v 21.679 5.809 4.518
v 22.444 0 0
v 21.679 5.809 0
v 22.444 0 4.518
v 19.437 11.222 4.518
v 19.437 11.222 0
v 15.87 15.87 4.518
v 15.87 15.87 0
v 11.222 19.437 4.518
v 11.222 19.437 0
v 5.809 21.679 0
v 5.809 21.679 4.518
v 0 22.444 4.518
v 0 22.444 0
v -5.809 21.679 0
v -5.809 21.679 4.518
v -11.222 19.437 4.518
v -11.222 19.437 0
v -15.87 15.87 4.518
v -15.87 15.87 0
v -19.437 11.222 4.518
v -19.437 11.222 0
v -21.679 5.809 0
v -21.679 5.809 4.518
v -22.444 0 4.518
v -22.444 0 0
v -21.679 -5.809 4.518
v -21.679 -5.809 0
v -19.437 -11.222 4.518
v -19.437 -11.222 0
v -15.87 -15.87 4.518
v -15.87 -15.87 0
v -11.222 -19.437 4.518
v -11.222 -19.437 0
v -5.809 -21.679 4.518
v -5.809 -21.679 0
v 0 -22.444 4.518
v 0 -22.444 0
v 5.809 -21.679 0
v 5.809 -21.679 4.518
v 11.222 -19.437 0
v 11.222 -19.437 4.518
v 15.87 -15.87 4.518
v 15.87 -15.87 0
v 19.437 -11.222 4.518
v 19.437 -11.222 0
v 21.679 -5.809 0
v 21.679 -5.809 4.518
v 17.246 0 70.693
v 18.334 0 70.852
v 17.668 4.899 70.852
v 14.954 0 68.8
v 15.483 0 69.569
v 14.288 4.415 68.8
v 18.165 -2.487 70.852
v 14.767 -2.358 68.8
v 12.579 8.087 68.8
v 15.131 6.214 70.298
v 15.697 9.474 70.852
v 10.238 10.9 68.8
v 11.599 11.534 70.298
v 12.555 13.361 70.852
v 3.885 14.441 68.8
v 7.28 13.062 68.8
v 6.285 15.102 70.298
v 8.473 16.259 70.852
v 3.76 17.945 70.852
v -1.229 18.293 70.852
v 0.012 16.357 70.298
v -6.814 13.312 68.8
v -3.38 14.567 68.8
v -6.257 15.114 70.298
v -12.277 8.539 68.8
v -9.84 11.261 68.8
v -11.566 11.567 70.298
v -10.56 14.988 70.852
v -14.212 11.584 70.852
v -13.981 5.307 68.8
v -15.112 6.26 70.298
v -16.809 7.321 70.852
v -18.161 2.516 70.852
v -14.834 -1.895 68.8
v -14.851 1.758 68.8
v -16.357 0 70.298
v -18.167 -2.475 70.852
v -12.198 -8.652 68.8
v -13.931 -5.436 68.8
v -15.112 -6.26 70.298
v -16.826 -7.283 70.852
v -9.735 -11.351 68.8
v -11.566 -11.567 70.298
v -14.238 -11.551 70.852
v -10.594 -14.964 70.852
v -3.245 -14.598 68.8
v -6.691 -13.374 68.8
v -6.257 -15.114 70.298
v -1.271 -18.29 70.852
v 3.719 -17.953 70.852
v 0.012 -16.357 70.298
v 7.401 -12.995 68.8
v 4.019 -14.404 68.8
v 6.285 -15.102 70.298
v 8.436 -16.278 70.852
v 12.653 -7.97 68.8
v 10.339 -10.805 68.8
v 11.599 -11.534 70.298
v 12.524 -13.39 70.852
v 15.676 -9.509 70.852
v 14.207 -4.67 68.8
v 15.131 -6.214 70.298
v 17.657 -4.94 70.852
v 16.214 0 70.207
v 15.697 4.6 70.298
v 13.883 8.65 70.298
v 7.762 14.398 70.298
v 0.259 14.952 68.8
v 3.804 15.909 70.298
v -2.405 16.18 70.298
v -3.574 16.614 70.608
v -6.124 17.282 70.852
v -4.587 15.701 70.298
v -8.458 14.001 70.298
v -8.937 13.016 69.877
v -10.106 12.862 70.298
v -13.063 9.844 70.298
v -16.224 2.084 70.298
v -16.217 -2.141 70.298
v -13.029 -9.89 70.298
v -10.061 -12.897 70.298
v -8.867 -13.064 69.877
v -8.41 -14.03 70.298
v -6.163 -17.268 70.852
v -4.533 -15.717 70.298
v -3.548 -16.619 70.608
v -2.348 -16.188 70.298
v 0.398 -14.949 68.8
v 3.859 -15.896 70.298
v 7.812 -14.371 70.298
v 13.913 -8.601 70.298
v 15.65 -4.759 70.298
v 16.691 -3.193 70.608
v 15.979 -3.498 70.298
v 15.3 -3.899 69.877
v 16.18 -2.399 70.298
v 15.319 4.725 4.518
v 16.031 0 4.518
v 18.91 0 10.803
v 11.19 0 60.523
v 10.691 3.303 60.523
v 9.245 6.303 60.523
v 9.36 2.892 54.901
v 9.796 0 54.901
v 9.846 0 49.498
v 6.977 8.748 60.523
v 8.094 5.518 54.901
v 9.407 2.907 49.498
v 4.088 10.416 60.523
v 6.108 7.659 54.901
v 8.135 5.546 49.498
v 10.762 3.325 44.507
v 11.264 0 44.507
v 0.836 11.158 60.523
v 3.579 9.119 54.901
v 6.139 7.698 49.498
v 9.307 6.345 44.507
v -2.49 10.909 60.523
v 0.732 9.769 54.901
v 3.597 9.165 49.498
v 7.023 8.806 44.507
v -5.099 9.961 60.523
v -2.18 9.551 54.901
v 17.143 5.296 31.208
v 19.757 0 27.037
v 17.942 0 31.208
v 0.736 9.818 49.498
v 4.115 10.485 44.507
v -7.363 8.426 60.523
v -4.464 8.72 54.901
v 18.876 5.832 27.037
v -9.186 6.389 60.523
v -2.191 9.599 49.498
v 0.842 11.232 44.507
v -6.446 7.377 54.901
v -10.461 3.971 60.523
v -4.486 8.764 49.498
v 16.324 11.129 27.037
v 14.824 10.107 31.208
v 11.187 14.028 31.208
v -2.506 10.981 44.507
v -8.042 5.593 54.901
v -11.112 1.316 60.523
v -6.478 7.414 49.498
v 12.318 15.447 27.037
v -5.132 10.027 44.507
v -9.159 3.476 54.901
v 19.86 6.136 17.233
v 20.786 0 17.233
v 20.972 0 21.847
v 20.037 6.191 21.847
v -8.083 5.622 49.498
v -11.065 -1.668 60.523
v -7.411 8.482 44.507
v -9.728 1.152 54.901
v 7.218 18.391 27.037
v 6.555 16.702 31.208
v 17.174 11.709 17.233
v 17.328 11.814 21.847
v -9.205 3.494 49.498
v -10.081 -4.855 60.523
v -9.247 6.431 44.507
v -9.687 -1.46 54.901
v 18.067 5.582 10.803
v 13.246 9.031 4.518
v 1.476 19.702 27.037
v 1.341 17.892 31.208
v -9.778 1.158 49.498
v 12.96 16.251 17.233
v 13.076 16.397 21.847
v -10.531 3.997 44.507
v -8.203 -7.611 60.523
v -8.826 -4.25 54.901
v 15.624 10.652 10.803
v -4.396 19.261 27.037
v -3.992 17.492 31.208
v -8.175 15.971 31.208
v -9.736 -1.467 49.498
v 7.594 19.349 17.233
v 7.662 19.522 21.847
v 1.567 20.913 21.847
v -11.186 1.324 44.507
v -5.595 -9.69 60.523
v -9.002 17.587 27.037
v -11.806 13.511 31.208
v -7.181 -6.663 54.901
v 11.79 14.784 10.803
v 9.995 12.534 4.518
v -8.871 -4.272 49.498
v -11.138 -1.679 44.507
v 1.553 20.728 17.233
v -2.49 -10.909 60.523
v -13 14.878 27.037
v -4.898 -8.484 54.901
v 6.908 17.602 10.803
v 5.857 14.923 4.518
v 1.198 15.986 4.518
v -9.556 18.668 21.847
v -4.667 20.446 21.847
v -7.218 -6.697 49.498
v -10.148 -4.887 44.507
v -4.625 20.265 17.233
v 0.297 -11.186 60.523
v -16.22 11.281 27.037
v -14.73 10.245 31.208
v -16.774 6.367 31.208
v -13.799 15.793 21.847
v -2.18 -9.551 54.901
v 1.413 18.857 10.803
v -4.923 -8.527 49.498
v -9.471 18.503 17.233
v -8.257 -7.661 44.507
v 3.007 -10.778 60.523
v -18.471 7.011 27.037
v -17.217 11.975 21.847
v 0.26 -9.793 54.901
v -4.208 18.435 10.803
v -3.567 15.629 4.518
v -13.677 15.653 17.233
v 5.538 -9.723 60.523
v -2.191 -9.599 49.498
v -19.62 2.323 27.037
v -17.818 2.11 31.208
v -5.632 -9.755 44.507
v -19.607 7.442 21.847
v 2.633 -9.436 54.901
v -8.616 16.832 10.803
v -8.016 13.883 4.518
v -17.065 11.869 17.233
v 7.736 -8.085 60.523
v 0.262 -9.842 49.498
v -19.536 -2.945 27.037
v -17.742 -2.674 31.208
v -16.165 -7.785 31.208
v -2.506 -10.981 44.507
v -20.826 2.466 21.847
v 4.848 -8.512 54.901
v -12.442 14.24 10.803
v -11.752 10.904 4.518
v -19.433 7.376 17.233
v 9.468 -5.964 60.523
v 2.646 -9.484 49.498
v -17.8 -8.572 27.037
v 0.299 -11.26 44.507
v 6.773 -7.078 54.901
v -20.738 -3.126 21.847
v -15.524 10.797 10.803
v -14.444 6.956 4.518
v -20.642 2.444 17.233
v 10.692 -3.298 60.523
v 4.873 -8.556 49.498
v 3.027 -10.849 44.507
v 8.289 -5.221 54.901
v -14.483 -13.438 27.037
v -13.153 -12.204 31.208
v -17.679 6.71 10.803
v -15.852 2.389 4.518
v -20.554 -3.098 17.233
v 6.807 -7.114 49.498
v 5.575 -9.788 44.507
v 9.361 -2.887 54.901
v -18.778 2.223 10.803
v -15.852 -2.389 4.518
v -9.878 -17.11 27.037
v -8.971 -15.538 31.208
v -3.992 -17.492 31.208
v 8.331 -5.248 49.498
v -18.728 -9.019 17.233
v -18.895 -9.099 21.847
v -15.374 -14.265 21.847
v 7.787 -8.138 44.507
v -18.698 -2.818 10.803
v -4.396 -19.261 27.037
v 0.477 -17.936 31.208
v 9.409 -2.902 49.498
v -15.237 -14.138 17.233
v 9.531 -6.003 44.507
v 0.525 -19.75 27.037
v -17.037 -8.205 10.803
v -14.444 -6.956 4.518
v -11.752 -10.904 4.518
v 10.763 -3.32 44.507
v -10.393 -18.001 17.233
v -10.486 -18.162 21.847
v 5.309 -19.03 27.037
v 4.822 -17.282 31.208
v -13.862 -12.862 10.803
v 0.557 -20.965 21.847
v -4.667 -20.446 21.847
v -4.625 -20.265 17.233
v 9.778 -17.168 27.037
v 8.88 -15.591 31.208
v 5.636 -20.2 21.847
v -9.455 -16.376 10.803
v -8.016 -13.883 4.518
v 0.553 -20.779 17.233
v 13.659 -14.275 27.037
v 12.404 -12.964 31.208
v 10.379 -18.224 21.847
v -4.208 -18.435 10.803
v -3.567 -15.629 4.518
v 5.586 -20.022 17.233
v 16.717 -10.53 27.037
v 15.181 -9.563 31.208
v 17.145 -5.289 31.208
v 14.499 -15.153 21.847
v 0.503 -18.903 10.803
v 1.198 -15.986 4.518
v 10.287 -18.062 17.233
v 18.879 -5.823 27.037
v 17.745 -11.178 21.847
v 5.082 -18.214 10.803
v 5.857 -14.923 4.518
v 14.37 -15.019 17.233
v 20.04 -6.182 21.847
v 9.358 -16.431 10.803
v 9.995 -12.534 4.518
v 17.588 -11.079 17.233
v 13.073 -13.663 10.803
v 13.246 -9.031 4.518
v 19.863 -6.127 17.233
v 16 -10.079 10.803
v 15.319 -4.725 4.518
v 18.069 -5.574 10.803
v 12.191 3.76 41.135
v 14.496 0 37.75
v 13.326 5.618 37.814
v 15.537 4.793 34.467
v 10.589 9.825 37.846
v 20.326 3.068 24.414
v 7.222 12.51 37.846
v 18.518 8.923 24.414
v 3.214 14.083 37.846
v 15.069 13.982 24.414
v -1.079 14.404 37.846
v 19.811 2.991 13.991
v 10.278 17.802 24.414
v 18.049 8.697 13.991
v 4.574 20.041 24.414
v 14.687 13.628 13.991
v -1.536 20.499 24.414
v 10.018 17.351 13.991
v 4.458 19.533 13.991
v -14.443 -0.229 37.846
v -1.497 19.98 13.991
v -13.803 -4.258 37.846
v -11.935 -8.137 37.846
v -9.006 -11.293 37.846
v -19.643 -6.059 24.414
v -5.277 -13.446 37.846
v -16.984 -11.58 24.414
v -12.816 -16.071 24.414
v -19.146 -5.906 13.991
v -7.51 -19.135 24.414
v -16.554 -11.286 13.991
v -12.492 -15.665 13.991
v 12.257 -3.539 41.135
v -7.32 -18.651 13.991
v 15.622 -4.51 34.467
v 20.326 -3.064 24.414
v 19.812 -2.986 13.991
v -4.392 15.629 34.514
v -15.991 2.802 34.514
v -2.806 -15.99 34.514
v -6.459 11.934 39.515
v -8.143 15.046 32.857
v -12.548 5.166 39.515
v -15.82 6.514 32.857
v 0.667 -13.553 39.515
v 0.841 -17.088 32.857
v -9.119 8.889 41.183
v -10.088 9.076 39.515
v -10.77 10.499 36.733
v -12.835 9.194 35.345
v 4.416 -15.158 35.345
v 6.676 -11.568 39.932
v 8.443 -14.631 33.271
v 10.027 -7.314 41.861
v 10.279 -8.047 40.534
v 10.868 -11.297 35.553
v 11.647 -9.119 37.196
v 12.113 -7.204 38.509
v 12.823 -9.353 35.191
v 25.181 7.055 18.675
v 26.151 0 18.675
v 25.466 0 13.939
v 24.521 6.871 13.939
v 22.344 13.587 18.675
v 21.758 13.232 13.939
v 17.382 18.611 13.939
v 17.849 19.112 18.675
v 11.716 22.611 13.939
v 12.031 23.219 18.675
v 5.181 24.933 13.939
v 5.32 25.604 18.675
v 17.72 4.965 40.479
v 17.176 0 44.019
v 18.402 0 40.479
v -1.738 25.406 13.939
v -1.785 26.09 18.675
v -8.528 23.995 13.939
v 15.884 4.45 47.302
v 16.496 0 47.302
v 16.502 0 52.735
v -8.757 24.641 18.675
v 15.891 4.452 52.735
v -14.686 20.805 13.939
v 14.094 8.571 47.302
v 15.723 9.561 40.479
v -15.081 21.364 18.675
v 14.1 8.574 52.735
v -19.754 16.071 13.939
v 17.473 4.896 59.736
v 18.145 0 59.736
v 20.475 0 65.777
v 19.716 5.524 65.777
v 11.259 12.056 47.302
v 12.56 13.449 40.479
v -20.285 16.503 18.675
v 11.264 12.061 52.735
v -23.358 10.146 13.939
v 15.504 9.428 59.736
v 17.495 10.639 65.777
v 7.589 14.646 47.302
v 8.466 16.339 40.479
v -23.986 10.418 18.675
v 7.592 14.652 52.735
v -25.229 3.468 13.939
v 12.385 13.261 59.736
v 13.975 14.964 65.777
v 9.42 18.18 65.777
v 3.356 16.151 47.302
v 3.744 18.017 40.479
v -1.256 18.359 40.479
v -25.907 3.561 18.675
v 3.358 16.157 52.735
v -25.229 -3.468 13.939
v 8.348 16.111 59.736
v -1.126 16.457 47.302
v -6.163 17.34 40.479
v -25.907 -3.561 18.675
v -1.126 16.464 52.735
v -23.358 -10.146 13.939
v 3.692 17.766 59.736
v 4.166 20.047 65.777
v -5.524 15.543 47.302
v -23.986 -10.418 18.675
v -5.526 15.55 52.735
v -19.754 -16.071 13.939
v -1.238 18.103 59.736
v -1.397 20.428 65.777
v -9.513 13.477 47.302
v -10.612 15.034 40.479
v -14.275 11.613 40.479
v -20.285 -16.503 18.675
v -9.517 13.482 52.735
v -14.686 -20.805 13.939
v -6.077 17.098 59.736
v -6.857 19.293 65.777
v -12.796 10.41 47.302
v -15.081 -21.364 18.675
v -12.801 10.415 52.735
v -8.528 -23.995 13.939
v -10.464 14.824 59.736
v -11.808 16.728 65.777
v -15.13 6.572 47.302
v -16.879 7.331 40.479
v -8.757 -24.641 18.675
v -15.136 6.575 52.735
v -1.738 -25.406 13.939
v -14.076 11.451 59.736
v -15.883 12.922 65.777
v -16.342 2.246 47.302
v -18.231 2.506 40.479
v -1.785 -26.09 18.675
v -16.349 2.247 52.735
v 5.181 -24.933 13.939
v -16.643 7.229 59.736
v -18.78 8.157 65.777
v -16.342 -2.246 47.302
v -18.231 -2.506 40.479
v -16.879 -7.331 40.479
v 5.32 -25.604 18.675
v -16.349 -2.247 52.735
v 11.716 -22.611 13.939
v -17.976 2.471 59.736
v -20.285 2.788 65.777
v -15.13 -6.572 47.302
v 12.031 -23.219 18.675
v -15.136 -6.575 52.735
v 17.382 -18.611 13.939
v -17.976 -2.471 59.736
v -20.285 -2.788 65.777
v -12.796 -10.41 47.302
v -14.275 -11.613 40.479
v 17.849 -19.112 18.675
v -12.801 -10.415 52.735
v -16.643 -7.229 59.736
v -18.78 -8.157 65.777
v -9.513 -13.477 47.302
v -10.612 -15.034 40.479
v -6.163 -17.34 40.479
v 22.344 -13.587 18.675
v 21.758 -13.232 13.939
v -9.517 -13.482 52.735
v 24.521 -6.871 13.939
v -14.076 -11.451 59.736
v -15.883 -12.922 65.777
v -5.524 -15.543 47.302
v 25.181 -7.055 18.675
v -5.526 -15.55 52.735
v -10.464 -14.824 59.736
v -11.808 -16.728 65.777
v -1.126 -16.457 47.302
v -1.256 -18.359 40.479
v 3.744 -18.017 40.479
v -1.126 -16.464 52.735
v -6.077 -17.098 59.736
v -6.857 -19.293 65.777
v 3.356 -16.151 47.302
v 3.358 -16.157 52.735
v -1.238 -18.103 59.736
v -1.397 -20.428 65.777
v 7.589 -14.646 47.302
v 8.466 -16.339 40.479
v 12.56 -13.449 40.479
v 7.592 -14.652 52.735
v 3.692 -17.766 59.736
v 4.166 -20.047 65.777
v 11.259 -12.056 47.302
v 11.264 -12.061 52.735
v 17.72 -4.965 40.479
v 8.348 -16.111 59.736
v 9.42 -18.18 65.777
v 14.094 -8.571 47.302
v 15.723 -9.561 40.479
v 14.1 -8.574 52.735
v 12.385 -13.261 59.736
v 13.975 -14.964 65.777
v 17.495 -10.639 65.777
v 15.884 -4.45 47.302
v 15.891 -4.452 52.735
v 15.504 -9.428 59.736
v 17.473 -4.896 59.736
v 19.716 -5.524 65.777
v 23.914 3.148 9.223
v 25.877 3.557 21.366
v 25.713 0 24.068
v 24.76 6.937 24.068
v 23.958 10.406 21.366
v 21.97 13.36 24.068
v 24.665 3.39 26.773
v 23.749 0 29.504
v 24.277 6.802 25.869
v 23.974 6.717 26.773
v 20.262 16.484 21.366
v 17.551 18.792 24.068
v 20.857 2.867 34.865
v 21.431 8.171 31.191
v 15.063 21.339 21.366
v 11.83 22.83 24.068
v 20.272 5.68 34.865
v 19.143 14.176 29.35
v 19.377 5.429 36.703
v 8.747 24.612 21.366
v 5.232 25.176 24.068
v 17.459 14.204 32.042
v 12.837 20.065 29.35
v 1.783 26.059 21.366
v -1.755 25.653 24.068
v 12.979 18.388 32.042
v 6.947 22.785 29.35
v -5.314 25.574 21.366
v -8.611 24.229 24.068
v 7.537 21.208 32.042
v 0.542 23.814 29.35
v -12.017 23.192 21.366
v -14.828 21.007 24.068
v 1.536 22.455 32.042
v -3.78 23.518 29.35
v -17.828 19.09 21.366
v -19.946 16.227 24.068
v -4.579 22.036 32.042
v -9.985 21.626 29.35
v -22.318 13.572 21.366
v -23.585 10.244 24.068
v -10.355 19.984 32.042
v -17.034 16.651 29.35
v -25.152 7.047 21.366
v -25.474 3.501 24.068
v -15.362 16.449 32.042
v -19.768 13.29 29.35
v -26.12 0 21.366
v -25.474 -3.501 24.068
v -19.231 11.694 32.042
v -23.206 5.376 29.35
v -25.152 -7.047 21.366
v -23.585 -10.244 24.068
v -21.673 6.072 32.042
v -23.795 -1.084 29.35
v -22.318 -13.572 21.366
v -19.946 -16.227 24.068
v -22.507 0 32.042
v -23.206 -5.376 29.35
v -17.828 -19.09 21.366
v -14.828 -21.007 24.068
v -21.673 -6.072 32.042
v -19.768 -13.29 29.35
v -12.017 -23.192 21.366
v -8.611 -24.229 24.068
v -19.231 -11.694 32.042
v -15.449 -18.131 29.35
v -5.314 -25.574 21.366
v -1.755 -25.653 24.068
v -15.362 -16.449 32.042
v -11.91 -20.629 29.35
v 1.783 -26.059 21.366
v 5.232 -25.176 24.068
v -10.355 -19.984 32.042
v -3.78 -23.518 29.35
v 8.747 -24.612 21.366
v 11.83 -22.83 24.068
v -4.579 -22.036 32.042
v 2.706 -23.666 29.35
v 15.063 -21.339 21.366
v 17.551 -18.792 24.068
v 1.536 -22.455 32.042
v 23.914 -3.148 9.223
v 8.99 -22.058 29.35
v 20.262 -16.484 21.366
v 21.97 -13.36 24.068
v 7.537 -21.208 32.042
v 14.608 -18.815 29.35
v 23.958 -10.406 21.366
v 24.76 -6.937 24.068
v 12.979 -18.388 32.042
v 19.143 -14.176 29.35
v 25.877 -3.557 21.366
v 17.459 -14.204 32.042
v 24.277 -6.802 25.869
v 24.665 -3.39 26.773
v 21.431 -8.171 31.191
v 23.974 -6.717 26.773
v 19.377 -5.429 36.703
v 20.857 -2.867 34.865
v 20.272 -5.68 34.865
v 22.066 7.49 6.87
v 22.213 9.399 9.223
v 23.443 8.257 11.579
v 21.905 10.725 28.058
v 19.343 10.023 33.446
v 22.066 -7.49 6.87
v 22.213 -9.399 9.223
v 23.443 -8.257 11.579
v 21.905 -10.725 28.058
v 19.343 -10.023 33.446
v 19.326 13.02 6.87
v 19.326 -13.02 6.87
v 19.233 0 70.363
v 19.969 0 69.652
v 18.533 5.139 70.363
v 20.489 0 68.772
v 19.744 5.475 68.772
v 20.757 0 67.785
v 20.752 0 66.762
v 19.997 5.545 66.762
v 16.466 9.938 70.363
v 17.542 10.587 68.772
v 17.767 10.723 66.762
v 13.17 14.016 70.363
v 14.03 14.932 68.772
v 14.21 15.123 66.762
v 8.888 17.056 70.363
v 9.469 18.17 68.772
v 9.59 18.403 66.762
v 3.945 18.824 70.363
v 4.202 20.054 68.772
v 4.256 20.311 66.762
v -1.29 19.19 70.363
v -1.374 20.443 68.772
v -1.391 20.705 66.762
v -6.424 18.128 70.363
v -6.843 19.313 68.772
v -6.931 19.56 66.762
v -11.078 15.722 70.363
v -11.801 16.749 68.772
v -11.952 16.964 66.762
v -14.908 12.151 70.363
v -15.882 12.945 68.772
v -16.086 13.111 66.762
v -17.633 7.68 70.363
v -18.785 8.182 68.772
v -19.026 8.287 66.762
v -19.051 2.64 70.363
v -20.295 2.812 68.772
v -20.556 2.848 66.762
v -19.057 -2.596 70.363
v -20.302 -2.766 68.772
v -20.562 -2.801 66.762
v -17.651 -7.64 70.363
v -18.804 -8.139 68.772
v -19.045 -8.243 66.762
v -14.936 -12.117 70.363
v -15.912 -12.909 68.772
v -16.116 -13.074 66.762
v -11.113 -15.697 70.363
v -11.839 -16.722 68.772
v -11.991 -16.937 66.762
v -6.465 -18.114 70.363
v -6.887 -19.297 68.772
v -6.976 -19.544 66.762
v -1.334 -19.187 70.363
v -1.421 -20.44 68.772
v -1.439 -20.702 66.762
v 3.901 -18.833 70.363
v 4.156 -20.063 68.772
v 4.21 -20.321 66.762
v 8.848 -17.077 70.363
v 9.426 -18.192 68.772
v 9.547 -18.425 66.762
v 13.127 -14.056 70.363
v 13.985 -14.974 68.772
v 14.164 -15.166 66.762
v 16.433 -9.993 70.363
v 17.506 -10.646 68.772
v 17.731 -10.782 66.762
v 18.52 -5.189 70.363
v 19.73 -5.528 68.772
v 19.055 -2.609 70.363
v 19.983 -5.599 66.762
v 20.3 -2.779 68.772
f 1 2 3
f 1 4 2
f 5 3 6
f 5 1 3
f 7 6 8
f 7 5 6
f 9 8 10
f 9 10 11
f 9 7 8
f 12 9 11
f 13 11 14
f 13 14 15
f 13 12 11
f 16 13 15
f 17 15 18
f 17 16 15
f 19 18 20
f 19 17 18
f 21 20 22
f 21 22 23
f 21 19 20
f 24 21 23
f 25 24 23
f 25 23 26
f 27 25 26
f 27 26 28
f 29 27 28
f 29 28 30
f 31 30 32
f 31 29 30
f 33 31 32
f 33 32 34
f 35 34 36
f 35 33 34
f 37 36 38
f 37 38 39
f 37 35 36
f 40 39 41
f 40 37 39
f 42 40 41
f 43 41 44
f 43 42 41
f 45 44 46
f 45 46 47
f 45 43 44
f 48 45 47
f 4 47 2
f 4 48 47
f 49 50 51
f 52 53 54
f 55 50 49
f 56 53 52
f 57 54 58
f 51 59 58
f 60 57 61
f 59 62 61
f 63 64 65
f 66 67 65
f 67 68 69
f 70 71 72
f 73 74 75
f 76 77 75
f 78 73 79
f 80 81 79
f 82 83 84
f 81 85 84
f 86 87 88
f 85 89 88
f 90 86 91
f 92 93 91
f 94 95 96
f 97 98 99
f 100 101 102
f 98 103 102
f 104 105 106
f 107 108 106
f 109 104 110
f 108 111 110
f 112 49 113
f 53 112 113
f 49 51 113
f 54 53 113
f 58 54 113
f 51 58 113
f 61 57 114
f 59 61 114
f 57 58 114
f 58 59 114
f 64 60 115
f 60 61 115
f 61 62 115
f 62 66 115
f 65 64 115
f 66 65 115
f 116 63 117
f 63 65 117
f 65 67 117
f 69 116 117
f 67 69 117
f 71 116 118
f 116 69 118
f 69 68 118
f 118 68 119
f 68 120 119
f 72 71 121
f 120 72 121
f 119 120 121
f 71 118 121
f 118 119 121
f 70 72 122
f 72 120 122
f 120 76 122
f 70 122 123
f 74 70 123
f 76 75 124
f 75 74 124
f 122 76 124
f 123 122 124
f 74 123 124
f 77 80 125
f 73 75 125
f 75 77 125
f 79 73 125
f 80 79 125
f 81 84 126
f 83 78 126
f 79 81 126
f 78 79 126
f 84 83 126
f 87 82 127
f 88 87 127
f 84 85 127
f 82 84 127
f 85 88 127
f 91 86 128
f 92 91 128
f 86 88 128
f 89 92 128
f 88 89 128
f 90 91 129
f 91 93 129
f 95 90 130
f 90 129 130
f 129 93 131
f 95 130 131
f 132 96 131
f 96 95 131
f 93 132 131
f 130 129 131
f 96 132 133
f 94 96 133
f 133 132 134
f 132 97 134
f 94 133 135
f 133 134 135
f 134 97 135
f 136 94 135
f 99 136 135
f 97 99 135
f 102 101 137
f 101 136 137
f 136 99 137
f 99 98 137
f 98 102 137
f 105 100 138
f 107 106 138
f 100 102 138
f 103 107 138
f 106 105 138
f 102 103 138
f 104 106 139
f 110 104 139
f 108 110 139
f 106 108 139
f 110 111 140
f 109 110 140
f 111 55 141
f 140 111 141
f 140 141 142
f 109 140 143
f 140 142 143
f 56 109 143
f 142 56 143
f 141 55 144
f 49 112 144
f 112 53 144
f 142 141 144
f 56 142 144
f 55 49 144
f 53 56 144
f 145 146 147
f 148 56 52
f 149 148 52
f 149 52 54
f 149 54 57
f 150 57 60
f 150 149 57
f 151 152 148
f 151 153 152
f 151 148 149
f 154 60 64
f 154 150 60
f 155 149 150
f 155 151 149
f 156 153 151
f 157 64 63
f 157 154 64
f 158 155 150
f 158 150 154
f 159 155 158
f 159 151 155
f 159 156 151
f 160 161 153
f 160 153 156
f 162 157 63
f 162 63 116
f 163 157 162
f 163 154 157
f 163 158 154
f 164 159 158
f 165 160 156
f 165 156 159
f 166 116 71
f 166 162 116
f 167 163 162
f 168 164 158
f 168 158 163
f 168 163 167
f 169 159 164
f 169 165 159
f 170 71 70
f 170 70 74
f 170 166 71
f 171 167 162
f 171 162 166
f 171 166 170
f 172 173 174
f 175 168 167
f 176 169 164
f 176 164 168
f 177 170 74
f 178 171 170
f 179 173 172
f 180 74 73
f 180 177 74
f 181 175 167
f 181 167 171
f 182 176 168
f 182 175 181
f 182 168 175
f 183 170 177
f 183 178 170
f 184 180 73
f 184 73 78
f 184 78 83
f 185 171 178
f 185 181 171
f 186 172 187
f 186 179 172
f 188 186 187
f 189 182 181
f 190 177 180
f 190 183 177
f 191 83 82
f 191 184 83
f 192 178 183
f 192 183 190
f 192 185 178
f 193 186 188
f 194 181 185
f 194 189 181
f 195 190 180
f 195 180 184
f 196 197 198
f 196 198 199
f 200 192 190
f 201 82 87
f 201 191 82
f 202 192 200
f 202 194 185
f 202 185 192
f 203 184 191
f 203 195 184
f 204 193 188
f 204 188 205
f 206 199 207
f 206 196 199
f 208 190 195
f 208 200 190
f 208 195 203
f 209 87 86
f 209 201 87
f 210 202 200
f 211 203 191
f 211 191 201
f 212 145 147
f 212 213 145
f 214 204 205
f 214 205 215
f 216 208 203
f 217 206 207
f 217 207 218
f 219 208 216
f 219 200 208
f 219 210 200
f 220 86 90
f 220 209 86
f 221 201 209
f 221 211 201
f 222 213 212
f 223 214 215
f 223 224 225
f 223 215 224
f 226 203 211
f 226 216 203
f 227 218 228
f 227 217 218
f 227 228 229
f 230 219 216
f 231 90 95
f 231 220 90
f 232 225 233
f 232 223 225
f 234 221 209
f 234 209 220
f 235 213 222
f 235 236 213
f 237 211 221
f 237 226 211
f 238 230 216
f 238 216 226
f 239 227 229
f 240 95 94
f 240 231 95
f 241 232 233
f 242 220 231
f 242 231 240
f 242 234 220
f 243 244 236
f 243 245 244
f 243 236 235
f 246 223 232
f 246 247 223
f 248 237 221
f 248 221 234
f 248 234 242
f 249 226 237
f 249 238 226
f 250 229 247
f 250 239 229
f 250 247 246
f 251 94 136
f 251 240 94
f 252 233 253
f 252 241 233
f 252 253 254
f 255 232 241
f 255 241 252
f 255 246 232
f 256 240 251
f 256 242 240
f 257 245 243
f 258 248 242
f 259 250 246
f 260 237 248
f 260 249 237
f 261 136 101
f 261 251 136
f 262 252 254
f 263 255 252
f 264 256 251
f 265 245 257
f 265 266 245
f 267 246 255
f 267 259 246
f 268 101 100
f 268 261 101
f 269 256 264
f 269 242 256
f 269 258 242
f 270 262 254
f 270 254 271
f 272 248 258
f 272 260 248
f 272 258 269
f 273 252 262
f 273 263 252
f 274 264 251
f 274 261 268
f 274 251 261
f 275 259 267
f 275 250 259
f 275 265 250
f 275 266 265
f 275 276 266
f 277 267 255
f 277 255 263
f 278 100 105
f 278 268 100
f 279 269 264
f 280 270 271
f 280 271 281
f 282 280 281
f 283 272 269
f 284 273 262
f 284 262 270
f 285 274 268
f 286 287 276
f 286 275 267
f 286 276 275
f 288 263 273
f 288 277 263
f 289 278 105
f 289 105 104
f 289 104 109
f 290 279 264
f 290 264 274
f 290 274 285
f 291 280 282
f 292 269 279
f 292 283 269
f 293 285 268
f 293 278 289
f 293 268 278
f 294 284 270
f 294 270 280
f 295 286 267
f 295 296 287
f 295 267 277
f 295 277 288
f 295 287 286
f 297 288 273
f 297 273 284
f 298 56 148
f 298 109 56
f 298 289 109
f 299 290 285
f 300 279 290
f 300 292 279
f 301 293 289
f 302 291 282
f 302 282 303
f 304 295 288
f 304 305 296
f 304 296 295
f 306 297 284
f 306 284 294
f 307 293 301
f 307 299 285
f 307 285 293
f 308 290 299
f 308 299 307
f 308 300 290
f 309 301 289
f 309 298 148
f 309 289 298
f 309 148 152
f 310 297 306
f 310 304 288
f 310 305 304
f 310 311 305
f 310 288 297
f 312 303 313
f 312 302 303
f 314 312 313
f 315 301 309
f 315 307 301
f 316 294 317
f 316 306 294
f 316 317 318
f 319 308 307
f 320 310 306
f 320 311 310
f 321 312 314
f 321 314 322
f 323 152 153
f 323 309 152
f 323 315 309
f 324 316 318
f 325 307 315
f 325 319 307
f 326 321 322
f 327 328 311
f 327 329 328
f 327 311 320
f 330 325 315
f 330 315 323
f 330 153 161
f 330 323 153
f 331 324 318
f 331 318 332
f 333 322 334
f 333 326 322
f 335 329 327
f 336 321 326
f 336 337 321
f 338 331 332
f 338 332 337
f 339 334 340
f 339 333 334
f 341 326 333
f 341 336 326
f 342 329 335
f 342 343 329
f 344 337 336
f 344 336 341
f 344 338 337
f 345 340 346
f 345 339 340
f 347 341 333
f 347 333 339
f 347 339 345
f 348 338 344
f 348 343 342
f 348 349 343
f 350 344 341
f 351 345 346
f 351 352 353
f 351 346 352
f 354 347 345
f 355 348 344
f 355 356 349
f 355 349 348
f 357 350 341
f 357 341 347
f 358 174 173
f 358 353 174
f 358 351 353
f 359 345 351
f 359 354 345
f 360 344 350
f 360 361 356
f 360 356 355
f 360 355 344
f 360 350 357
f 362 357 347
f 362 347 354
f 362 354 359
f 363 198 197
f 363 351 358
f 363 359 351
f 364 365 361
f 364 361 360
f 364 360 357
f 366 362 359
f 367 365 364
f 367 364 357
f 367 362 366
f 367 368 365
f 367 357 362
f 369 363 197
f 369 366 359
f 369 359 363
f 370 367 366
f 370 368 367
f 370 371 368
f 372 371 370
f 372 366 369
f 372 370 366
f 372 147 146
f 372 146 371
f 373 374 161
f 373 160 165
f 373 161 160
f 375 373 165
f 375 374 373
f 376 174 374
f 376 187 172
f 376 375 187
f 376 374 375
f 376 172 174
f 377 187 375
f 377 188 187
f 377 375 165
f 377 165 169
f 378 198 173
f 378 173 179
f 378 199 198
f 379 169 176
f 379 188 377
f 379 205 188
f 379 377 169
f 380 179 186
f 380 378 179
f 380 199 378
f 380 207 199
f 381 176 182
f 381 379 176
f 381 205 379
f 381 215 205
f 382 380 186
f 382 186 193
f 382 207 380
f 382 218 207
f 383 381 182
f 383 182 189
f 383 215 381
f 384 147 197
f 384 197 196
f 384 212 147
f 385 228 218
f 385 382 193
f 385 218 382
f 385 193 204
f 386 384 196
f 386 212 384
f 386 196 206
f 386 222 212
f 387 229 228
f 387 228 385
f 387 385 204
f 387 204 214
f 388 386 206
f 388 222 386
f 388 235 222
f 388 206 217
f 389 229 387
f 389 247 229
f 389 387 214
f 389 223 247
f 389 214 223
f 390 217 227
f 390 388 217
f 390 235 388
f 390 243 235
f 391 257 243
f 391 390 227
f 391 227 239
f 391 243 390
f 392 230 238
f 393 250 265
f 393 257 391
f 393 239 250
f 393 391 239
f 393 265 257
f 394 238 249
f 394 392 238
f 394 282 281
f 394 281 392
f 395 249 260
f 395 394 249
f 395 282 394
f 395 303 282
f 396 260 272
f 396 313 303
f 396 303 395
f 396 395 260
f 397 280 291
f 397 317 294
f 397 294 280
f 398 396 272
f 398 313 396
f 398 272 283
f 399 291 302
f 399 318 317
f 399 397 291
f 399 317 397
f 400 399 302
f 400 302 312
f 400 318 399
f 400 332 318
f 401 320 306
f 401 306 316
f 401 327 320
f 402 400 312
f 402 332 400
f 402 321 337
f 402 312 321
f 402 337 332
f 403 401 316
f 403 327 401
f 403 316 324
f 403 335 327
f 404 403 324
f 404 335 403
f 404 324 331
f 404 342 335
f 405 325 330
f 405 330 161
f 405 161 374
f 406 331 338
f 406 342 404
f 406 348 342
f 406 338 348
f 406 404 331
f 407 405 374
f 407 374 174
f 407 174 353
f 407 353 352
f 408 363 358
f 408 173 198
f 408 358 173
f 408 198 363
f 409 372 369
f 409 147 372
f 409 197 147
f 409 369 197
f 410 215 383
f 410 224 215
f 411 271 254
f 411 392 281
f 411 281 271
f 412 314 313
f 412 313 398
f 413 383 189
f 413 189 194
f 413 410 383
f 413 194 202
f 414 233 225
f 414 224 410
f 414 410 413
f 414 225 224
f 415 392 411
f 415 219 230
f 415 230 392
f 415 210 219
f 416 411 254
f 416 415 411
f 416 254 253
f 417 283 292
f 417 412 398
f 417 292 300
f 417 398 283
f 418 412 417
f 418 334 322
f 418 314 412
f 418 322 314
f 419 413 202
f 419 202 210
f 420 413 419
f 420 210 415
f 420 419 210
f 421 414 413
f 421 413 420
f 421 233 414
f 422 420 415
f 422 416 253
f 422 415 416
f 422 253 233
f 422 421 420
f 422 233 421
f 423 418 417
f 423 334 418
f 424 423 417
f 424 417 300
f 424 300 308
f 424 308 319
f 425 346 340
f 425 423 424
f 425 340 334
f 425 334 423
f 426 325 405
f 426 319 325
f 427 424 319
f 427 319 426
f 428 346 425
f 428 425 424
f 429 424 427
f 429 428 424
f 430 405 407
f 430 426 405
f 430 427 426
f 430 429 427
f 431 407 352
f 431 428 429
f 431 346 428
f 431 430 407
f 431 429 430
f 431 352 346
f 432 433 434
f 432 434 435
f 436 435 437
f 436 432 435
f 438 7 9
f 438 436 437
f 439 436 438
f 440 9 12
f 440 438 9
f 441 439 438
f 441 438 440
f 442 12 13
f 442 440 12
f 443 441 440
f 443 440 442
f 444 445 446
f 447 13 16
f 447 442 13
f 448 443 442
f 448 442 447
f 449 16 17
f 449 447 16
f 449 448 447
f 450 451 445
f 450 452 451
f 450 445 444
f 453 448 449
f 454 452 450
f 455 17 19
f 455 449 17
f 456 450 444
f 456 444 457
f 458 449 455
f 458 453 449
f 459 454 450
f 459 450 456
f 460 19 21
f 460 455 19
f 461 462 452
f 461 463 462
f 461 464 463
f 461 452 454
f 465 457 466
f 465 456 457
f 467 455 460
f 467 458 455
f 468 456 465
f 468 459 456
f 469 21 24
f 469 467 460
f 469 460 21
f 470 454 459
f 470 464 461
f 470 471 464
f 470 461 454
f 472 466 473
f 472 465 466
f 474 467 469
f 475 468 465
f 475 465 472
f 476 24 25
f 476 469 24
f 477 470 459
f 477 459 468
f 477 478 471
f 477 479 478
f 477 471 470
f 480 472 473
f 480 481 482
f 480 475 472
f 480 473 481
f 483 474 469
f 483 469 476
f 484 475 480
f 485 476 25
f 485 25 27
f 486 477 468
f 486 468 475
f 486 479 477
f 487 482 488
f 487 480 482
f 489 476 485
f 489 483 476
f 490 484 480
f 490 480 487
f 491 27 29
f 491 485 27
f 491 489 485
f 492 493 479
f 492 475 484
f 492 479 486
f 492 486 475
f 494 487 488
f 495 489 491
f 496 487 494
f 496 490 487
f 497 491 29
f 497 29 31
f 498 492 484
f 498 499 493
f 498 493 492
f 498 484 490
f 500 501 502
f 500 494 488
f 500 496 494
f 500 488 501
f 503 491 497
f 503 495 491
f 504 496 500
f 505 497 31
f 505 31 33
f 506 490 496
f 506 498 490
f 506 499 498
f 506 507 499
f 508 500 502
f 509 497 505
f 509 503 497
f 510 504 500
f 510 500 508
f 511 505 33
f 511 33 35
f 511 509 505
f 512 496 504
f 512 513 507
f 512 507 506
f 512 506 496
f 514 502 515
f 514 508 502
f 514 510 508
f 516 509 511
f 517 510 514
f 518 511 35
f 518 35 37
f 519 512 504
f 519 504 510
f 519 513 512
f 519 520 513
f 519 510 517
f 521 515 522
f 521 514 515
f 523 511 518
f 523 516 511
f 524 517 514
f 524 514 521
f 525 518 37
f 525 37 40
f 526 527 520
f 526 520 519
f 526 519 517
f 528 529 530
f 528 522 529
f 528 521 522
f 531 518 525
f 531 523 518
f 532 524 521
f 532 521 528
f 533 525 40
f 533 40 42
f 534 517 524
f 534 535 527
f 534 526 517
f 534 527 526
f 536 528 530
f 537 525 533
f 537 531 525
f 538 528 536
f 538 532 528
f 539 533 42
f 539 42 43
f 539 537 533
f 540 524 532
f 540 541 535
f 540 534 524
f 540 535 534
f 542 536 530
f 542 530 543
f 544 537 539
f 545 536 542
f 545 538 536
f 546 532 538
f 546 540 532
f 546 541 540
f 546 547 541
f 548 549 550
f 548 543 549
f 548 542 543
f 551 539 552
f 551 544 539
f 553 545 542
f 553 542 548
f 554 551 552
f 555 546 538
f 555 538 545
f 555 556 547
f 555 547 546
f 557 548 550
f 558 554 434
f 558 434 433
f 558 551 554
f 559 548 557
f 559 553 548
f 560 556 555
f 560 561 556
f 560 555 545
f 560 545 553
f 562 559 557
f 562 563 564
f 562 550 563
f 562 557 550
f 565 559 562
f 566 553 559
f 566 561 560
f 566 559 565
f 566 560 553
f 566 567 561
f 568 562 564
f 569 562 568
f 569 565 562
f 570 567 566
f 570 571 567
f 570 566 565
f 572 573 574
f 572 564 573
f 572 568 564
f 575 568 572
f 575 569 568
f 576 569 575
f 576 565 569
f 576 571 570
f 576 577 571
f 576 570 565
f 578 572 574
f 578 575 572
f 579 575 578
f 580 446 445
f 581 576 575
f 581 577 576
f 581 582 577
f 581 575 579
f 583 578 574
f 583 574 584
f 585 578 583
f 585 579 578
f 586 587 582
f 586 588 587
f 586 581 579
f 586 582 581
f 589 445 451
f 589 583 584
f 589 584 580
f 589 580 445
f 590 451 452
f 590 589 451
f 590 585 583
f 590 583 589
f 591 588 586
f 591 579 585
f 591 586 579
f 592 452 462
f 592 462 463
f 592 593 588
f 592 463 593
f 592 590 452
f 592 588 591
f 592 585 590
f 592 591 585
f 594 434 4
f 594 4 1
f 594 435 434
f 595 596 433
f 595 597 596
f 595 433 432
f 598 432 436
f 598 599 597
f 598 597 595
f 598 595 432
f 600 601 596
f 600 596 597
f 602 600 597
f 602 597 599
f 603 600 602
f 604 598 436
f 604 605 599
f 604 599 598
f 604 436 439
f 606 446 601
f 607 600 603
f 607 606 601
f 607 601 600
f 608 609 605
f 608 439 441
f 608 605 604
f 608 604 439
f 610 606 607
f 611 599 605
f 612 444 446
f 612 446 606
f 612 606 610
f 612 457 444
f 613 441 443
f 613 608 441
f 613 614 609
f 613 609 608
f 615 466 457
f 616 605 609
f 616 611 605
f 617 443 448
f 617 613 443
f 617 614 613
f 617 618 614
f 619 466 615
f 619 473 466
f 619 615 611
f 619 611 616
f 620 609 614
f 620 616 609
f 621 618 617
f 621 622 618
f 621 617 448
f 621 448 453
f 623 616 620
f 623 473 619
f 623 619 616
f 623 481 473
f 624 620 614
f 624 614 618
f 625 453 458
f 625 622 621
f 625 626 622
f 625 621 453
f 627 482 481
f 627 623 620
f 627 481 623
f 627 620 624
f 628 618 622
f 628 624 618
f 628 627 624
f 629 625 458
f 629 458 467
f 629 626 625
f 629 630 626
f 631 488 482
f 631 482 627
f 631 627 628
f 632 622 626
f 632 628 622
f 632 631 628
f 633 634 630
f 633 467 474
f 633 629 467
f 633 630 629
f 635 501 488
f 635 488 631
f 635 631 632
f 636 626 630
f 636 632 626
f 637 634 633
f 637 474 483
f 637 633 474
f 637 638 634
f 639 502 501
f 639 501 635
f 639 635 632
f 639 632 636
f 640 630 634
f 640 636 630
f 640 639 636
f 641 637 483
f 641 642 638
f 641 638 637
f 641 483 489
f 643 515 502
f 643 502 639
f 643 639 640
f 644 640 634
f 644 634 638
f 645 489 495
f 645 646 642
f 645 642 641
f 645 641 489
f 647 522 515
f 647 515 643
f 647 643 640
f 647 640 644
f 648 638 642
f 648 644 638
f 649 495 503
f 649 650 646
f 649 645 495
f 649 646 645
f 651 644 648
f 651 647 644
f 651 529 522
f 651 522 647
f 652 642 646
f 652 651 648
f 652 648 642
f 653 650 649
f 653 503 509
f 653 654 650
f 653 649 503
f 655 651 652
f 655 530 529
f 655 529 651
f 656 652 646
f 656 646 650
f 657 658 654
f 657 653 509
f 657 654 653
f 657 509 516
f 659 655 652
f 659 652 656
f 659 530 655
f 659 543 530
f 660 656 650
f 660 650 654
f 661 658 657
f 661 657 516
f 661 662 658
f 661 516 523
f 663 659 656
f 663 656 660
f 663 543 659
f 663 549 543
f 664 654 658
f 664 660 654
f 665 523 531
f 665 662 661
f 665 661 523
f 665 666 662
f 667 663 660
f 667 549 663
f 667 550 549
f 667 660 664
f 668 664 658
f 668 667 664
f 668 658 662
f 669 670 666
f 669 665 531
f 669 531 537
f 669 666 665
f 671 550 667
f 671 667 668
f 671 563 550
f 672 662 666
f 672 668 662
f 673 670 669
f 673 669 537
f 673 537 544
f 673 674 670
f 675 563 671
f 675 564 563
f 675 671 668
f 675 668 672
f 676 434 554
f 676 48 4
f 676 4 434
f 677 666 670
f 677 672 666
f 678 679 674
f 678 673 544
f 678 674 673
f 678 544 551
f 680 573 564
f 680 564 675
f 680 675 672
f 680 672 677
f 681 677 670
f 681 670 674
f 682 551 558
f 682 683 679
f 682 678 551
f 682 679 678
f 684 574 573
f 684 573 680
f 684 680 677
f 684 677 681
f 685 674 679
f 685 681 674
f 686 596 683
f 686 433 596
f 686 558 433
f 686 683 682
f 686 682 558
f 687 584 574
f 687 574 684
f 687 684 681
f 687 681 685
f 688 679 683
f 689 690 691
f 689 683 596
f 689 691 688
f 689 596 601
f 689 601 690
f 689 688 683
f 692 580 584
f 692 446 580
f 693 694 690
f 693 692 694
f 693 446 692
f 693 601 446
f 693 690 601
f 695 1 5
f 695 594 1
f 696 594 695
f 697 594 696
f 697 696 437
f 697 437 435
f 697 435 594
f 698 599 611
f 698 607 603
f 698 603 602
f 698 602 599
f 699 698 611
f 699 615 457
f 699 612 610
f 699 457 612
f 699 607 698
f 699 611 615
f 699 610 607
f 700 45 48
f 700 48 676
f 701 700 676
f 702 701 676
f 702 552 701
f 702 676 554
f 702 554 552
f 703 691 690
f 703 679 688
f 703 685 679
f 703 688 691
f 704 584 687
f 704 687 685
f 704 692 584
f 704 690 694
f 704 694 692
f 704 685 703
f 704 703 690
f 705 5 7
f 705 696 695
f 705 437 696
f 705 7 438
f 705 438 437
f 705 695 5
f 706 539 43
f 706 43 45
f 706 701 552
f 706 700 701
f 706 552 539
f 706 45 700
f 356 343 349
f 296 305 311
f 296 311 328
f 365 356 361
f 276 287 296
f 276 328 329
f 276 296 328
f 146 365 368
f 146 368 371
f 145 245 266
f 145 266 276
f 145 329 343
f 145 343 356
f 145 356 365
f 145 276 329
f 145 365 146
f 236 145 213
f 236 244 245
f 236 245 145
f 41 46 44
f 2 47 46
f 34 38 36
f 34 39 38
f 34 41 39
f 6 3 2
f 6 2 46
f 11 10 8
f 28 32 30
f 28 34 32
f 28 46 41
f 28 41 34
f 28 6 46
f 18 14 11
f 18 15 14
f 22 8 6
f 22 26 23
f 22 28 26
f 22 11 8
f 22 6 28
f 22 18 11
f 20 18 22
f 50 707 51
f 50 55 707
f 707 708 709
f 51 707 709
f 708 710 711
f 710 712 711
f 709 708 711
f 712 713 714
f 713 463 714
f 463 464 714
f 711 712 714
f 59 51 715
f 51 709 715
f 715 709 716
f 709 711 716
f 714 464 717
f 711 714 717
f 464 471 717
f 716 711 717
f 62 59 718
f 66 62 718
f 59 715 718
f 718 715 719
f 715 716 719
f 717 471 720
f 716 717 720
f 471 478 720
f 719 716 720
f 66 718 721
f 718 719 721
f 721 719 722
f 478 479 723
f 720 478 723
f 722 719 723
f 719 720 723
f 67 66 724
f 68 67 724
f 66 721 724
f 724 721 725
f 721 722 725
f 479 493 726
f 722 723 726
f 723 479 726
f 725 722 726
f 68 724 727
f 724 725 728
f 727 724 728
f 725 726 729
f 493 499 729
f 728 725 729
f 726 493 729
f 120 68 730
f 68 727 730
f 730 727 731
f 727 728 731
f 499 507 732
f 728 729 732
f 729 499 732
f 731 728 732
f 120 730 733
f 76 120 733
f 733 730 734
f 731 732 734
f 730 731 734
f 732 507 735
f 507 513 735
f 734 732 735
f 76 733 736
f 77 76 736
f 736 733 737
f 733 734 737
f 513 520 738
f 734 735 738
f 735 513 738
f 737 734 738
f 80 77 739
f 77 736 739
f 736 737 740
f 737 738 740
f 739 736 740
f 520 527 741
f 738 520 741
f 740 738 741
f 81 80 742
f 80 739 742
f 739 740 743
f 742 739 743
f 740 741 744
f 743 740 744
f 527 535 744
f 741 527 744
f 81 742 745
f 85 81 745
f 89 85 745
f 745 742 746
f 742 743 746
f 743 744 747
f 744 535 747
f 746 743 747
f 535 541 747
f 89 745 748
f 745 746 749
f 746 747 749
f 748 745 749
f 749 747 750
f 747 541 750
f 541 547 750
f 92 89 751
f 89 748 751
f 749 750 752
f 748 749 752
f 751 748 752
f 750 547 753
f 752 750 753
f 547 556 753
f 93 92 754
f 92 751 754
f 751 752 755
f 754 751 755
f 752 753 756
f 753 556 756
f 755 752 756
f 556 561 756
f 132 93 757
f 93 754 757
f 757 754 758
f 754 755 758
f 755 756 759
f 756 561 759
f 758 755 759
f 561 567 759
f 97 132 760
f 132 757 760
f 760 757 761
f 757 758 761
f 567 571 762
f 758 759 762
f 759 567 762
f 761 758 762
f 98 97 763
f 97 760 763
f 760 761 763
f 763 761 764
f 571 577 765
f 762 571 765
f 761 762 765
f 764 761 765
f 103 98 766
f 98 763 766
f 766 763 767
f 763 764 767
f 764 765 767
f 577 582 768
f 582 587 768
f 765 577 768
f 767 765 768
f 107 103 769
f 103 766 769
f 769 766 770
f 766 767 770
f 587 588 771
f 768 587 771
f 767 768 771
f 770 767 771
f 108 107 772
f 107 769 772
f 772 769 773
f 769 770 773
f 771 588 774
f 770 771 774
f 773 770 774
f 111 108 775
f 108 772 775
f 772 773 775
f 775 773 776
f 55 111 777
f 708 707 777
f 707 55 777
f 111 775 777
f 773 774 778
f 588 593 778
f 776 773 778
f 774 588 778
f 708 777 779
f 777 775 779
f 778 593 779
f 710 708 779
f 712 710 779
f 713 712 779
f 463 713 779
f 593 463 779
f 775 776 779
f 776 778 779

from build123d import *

# Parameters (mm, degrees)
F2_R = 3.81


# Not quite as in the source:
# - a fillet or chamfer that OpenCascade refuses, or shapes differently, is made with other operations: its cross-section is extruded or revolved along the edge and cut away or added


with BuildPart() as f1:
    # F0 (on Front) → F1 (revolve)
    with BuildSketch(Plane.XZ):
        with BuildLine():
            Line((16.0311479121, 4.5178690925), (22.4436055869, 4.5178690925))
            add(Edge.make_bspline(
                [(22.4436055869, 4.5178690925), (24.8600250445, 11.0818898502), (30.0796146771, 25.2605104483), (9.8862561783, 47.130113274), (22.5218644375, 69.4640848416), (22.5048259424, 70.7529232387), (22.4827266771, 70.8515682757)],
                knots=[0, 0, 0, 0, 0.2969827086, 0.6414978418, 0.9493958447, 0.9840559336, 0.9840559336, 0.9840559336, 0.9840559336], degree=3))
            Line((22.4827266771, 70.8515682757), (16.0311479121, 70.8515682757))
            add(Edge.make_bspline(
                [(16.0311479121, 70.8515682757), (12.2960300416, 63.7655309581), (4.4341449473, 48.8504431093), (25.6194031292, 24.2310595898), (19.0460076919, 10.7163383464), (16.0311479121, 4.5178690925)],
                knots=[0, 0, 0, 0, 0.3288488059, 0.6921793675, 1, 1, 1, 1], degree=3))
        make_face()
        Polygon((0, 4.5178690925), (0, 0), (22.4436055869, 0), (22.4436055869, 4.5178690925), (16.0311479121, 4.5178690925), align=None)
    revolve(axis=Axis((0, 0, 38.2318794727), (0, 0, 1)))

    # F2
    f2_edges = [f1.edges().sort_by_distance(p)[0] for p in [
        (-16.031148, 0, 70.851568),
    ]]
    fillet(f2_edges, radius=F2_R)

    # F3: fillet of radius 3.81 on 1 edges, made by hand

    # F3_s1 → F3_t2 (revolve, cut)
    with BuildSketch(Plane.XZ):
        with BuildLine():
            ThreePointArc((18.3344840685, 70.8515682757), (20.4893461193, 68.7718326579), (20.4753256974, 65.7770815621))
            Line((20.4753256974, 65.7770815621), (20.5452530272, 65.7468060184))
            ThreePointArc((20.5452530272, 65.7468060184), (21.6482045261, 68.2389620465), (22.5570835846, 70.8682263162))
            Line((22.5570835846, 70.8682263162), (22.4827266771, 70.9277682757))
            ThreePointArc((22.4827266771, 70.9277682757), (20.4086053728, 70.9277682757), (18.3615945657, 70.9227824663))
            Line((18.3615945657, 70.9227824663), (18.3344840685, 70.8515682757))
        make_face()
    revolve(axis=Axis((0, 0, 70.8515682757), (0, 0, 1)), mode=Mode.SUBTRACT)


solid = f1.part
